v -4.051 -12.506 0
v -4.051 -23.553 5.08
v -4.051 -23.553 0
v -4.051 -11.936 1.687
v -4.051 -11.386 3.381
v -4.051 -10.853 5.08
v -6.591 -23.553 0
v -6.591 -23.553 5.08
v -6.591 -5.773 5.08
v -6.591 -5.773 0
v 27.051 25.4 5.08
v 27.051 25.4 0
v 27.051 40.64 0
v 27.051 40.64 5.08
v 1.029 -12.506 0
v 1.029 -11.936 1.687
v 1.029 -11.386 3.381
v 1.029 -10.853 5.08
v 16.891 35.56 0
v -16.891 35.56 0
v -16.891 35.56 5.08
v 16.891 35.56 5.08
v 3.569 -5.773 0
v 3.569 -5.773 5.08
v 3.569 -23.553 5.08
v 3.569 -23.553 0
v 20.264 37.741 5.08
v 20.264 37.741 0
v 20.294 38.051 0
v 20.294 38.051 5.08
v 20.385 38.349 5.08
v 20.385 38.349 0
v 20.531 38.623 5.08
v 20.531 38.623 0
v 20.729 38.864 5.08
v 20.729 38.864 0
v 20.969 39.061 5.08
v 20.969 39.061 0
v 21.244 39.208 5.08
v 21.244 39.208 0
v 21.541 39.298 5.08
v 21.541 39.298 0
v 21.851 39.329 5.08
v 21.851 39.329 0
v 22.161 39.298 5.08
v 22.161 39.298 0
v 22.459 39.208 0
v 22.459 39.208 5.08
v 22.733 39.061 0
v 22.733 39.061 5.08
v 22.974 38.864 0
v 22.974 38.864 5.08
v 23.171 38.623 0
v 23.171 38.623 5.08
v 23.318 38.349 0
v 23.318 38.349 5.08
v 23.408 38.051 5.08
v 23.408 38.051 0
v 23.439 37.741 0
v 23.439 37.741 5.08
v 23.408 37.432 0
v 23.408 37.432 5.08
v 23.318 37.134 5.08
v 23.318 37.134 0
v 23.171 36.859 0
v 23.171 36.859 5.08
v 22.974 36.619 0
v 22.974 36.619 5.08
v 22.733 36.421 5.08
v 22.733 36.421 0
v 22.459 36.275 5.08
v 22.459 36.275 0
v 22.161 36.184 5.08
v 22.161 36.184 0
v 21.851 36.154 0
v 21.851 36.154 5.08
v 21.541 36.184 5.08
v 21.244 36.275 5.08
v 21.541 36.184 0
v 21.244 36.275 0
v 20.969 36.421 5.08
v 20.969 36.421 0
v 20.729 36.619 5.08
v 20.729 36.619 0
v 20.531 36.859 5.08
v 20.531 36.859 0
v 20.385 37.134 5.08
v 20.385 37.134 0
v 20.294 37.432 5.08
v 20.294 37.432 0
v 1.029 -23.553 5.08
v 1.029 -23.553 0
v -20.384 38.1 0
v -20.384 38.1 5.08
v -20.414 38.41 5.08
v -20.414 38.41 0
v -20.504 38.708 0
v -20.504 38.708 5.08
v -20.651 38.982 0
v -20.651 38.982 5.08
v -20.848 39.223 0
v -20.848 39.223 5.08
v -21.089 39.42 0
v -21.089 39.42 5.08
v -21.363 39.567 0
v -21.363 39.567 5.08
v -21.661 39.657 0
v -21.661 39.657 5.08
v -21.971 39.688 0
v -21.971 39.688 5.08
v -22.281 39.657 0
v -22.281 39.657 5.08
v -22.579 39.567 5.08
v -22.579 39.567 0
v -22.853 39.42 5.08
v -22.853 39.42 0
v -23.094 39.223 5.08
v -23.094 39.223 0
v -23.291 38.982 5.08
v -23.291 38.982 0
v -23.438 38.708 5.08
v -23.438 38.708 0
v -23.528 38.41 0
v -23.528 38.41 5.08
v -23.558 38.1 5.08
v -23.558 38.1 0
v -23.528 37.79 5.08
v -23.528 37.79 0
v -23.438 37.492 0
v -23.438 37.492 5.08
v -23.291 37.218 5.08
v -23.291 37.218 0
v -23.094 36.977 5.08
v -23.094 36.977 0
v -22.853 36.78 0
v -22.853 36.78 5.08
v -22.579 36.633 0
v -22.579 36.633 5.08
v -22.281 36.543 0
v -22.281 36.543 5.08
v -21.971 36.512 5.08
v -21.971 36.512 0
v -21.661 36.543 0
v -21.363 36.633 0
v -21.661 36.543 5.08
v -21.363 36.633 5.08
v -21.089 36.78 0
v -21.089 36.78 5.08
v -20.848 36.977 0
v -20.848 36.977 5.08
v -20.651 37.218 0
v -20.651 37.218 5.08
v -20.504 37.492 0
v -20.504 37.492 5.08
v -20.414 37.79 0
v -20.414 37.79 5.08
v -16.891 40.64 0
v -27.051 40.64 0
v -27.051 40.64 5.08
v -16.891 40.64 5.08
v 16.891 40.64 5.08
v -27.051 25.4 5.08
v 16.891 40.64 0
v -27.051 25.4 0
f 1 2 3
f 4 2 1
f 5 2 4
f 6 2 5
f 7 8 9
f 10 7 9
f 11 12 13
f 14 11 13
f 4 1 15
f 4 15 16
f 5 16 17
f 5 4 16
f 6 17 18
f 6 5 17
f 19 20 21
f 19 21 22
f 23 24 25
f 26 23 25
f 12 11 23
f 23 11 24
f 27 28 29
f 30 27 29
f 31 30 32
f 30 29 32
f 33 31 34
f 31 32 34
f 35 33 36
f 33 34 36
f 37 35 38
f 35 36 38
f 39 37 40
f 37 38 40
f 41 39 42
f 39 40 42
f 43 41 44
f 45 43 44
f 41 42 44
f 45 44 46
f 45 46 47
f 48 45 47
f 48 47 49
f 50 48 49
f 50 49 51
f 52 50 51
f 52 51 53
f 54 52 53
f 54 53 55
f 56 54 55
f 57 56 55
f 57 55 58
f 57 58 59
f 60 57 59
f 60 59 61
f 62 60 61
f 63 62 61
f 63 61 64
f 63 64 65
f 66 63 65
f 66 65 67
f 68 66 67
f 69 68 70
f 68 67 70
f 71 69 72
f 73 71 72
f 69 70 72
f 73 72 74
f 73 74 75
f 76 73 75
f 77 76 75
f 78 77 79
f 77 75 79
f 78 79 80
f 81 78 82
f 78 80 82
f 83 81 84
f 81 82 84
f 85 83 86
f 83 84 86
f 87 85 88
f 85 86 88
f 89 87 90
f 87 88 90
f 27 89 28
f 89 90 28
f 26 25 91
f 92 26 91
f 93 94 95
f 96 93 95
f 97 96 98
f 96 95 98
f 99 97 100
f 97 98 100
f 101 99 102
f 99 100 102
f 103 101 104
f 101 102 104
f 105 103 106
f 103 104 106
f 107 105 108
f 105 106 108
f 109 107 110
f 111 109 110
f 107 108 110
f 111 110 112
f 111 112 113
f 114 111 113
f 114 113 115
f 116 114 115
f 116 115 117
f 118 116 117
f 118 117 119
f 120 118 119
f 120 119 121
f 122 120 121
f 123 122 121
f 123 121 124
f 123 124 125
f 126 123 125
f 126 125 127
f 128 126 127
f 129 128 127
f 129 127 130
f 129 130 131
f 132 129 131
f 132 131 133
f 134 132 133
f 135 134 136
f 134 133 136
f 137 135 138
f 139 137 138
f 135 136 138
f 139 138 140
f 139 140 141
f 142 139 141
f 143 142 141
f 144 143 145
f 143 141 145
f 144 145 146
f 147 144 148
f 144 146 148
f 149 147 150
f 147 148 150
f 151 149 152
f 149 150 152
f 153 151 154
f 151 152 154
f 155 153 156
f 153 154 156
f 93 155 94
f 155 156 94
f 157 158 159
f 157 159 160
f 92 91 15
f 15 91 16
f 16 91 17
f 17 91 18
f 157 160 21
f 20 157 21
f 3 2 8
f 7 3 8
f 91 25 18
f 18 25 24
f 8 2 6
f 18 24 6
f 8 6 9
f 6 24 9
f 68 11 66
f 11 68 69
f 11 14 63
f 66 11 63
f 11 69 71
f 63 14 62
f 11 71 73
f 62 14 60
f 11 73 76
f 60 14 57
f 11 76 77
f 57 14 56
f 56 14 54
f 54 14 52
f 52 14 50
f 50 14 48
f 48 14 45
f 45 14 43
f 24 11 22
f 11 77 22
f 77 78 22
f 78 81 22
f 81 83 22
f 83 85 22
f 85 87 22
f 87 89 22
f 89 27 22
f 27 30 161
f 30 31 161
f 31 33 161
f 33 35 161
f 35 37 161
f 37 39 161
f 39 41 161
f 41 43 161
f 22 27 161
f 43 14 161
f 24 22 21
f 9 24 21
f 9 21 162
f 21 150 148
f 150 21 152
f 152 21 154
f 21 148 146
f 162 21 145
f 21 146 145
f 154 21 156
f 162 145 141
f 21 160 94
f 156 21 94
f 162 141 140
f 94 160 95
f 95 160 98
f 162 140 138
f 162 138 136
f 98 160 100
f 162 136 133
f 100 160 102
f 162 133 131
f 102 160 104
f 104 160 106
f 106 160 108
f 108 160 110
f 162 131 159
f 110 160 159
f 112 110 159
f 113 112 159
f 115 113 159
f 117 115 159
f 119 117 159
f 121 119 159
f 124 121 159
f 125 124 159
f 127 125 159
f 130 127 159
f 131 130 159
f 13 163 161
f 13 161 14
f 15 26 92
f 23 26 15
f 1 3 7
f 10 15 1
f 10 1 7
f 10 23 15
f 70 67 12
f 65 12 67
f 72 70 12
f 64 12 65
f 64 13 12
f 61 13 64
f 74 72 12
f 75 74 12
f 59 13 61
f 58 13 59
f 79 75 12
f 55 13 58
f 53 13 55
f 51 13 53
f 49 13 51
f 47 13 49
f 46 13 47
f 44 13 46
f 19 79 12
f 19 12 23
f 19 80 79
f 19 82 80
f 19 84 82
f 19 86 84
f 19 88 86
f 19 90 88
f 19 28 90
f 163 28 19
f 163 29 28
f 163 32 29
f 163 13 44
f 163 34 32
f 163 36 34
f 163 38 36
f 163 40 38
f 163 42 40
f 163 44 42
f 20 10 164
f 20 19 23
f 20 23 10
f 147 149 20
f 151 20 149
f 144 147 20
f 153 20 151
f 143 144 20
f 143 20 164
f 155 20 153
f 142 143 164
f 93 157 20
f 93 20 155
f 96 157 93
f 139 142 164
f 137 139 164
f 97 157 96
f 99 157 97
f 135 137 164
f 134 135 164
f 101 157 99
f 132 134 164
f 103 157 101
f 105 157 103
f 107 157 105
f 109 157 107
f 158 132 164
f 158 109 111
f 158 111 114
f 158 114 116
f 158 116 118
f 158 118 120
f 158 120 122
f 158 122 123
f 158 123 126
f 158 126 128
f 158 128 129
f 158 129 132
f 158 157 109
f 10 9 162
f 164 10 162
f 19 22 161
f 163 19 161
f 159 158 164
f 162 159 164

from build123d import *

# Parameters (mm, degrees)
BOSS_EXTRUDE1_DEPTH = 5.08
SKETCH2_R           = 1.5875
CUT_EXTRUDE1_DEPTH  = 50.083323044
SKETCH3_R           = 1.5875
CUT_EXTRUDE2_DEPTH  = 50.083323044
CAVITY2_START       = -4.051115689
CAVITY2_OUTLINE_R   = 1.5875
CAVITY2_DEPTH       = 5.08
CUT_EXTRUDE3_DEPTH  = 50.083323044
SKETCH7_W           = 5.08
SKETCH7_H           = 11.047605328
CUT_EXTRUDE4_DEPTH  = 50.083323044


# Read off the part's stored shape, not the designer's step: Cavity2
with BuildPart() as part:
    # Sketch1 → Boss-Extrude1 (new body)
    with BuildSketch(Plane.XY):
        Polygon((-27.051, 40.64), (-16.891, 40.64), (-16.891, 35.56), (16.891, 35.56), (16.891, 40.64), (27.051, 40.64), (27.051, 30.48), (27.051, -40.64), (-27.051, -40.64), (-27.051, 30.48), align=None)
    extrude(amount=BOSS_EXTRUDE1_DEPTH)

    # Sketch2 → Cut-Extrude1 (cut, through all)
    with BuildSketch(Plane.XY.offset(5.08)):
        with Locations((-21.971, 38.1)):
            Circle(SKETCH2_R)
    extrude(amount=-CUT_EXTRUDE1_DEPTH, mode=Mode.SUBTRACT)

    # Sketch3 → Cut-Extrude2 (cut, through all)
    with BuildSketch(Plane(origin=(0, 0, 0), x_dir=(-1, 0, 0), z_dir=(0, 0, -1))):
        with Locations((-21.851181845, 37.741299139)):
            Circle(SKETCH3_R)
    extrude(amount=-CUT_EXTRUDE2_DEPTH, mode=Mode.SUBTRACT)

    # Cavity2 outline → Cavity2 (cut)
    with BuildSketch(Plane.YZ.offset(CAVITY2_START)):
        with BuildLine():
            ThreePointArc((-24.98622483, 5.08), (-25.105854872, 2.538856915), (-25.266867575, 0))
            Line((-25.266867575, 0), (-12.505553834, 0))
            ThreePointArc((-12.505553834, 0), (-11.65861771, 2.5332542), (-10.853159162, 5.08))
            Line((-10.853159162, 5.08), (-24.98622483, 5.08))
        make_face()
        with Locations((-18.473159162, 2.54)):
            Circle(CAVITY2_OUTLINE_R, mode=Mode.SUBTRACT)
    extrude(amount=CAVITY2_DEPTH, mode=Mode.SUBTRACT)

    # Sketch4 → Cut-Extrude3 (cut, through all)
    with BuildSketch(Plane.XY.offset(5.08)):
        Polygon((-4.051115689, -24.98622483), (-4.051115689, -23.553159162), (-6.591115689, -23.553159162), (-6.591115689, -5.773159162), (-27.051, 25.4), (-27.051, -40.64), (27.051, -40.64), (27.051, 25.4), (3.568884311, -5.773159162), (3.568884311, -23.553159162), (1.028884311, -23.553159162), (1.028884311, -24.98622483), align=None)
    extrude(amount=-CUT_EXTRUDE3_DEPTH, mode=Mode.SUBTRACT)

    # Sketch7 → Cut-Extrude4 (cut, through all)
    with BuildSketch(Plane(origin=(0, 0, 0), x_dir=(-1, 0, 0), z_dir=(0, 0, -1))):
        with Locations((1.511115689, -18.029356498)):
            Rectangle(SKETCH7_W, SKETCH7_H)
    extrude(amount=-CUT_EXTRUDE4_DEPTH, mode=Mode.SUBTRACT)


solid = part.part
